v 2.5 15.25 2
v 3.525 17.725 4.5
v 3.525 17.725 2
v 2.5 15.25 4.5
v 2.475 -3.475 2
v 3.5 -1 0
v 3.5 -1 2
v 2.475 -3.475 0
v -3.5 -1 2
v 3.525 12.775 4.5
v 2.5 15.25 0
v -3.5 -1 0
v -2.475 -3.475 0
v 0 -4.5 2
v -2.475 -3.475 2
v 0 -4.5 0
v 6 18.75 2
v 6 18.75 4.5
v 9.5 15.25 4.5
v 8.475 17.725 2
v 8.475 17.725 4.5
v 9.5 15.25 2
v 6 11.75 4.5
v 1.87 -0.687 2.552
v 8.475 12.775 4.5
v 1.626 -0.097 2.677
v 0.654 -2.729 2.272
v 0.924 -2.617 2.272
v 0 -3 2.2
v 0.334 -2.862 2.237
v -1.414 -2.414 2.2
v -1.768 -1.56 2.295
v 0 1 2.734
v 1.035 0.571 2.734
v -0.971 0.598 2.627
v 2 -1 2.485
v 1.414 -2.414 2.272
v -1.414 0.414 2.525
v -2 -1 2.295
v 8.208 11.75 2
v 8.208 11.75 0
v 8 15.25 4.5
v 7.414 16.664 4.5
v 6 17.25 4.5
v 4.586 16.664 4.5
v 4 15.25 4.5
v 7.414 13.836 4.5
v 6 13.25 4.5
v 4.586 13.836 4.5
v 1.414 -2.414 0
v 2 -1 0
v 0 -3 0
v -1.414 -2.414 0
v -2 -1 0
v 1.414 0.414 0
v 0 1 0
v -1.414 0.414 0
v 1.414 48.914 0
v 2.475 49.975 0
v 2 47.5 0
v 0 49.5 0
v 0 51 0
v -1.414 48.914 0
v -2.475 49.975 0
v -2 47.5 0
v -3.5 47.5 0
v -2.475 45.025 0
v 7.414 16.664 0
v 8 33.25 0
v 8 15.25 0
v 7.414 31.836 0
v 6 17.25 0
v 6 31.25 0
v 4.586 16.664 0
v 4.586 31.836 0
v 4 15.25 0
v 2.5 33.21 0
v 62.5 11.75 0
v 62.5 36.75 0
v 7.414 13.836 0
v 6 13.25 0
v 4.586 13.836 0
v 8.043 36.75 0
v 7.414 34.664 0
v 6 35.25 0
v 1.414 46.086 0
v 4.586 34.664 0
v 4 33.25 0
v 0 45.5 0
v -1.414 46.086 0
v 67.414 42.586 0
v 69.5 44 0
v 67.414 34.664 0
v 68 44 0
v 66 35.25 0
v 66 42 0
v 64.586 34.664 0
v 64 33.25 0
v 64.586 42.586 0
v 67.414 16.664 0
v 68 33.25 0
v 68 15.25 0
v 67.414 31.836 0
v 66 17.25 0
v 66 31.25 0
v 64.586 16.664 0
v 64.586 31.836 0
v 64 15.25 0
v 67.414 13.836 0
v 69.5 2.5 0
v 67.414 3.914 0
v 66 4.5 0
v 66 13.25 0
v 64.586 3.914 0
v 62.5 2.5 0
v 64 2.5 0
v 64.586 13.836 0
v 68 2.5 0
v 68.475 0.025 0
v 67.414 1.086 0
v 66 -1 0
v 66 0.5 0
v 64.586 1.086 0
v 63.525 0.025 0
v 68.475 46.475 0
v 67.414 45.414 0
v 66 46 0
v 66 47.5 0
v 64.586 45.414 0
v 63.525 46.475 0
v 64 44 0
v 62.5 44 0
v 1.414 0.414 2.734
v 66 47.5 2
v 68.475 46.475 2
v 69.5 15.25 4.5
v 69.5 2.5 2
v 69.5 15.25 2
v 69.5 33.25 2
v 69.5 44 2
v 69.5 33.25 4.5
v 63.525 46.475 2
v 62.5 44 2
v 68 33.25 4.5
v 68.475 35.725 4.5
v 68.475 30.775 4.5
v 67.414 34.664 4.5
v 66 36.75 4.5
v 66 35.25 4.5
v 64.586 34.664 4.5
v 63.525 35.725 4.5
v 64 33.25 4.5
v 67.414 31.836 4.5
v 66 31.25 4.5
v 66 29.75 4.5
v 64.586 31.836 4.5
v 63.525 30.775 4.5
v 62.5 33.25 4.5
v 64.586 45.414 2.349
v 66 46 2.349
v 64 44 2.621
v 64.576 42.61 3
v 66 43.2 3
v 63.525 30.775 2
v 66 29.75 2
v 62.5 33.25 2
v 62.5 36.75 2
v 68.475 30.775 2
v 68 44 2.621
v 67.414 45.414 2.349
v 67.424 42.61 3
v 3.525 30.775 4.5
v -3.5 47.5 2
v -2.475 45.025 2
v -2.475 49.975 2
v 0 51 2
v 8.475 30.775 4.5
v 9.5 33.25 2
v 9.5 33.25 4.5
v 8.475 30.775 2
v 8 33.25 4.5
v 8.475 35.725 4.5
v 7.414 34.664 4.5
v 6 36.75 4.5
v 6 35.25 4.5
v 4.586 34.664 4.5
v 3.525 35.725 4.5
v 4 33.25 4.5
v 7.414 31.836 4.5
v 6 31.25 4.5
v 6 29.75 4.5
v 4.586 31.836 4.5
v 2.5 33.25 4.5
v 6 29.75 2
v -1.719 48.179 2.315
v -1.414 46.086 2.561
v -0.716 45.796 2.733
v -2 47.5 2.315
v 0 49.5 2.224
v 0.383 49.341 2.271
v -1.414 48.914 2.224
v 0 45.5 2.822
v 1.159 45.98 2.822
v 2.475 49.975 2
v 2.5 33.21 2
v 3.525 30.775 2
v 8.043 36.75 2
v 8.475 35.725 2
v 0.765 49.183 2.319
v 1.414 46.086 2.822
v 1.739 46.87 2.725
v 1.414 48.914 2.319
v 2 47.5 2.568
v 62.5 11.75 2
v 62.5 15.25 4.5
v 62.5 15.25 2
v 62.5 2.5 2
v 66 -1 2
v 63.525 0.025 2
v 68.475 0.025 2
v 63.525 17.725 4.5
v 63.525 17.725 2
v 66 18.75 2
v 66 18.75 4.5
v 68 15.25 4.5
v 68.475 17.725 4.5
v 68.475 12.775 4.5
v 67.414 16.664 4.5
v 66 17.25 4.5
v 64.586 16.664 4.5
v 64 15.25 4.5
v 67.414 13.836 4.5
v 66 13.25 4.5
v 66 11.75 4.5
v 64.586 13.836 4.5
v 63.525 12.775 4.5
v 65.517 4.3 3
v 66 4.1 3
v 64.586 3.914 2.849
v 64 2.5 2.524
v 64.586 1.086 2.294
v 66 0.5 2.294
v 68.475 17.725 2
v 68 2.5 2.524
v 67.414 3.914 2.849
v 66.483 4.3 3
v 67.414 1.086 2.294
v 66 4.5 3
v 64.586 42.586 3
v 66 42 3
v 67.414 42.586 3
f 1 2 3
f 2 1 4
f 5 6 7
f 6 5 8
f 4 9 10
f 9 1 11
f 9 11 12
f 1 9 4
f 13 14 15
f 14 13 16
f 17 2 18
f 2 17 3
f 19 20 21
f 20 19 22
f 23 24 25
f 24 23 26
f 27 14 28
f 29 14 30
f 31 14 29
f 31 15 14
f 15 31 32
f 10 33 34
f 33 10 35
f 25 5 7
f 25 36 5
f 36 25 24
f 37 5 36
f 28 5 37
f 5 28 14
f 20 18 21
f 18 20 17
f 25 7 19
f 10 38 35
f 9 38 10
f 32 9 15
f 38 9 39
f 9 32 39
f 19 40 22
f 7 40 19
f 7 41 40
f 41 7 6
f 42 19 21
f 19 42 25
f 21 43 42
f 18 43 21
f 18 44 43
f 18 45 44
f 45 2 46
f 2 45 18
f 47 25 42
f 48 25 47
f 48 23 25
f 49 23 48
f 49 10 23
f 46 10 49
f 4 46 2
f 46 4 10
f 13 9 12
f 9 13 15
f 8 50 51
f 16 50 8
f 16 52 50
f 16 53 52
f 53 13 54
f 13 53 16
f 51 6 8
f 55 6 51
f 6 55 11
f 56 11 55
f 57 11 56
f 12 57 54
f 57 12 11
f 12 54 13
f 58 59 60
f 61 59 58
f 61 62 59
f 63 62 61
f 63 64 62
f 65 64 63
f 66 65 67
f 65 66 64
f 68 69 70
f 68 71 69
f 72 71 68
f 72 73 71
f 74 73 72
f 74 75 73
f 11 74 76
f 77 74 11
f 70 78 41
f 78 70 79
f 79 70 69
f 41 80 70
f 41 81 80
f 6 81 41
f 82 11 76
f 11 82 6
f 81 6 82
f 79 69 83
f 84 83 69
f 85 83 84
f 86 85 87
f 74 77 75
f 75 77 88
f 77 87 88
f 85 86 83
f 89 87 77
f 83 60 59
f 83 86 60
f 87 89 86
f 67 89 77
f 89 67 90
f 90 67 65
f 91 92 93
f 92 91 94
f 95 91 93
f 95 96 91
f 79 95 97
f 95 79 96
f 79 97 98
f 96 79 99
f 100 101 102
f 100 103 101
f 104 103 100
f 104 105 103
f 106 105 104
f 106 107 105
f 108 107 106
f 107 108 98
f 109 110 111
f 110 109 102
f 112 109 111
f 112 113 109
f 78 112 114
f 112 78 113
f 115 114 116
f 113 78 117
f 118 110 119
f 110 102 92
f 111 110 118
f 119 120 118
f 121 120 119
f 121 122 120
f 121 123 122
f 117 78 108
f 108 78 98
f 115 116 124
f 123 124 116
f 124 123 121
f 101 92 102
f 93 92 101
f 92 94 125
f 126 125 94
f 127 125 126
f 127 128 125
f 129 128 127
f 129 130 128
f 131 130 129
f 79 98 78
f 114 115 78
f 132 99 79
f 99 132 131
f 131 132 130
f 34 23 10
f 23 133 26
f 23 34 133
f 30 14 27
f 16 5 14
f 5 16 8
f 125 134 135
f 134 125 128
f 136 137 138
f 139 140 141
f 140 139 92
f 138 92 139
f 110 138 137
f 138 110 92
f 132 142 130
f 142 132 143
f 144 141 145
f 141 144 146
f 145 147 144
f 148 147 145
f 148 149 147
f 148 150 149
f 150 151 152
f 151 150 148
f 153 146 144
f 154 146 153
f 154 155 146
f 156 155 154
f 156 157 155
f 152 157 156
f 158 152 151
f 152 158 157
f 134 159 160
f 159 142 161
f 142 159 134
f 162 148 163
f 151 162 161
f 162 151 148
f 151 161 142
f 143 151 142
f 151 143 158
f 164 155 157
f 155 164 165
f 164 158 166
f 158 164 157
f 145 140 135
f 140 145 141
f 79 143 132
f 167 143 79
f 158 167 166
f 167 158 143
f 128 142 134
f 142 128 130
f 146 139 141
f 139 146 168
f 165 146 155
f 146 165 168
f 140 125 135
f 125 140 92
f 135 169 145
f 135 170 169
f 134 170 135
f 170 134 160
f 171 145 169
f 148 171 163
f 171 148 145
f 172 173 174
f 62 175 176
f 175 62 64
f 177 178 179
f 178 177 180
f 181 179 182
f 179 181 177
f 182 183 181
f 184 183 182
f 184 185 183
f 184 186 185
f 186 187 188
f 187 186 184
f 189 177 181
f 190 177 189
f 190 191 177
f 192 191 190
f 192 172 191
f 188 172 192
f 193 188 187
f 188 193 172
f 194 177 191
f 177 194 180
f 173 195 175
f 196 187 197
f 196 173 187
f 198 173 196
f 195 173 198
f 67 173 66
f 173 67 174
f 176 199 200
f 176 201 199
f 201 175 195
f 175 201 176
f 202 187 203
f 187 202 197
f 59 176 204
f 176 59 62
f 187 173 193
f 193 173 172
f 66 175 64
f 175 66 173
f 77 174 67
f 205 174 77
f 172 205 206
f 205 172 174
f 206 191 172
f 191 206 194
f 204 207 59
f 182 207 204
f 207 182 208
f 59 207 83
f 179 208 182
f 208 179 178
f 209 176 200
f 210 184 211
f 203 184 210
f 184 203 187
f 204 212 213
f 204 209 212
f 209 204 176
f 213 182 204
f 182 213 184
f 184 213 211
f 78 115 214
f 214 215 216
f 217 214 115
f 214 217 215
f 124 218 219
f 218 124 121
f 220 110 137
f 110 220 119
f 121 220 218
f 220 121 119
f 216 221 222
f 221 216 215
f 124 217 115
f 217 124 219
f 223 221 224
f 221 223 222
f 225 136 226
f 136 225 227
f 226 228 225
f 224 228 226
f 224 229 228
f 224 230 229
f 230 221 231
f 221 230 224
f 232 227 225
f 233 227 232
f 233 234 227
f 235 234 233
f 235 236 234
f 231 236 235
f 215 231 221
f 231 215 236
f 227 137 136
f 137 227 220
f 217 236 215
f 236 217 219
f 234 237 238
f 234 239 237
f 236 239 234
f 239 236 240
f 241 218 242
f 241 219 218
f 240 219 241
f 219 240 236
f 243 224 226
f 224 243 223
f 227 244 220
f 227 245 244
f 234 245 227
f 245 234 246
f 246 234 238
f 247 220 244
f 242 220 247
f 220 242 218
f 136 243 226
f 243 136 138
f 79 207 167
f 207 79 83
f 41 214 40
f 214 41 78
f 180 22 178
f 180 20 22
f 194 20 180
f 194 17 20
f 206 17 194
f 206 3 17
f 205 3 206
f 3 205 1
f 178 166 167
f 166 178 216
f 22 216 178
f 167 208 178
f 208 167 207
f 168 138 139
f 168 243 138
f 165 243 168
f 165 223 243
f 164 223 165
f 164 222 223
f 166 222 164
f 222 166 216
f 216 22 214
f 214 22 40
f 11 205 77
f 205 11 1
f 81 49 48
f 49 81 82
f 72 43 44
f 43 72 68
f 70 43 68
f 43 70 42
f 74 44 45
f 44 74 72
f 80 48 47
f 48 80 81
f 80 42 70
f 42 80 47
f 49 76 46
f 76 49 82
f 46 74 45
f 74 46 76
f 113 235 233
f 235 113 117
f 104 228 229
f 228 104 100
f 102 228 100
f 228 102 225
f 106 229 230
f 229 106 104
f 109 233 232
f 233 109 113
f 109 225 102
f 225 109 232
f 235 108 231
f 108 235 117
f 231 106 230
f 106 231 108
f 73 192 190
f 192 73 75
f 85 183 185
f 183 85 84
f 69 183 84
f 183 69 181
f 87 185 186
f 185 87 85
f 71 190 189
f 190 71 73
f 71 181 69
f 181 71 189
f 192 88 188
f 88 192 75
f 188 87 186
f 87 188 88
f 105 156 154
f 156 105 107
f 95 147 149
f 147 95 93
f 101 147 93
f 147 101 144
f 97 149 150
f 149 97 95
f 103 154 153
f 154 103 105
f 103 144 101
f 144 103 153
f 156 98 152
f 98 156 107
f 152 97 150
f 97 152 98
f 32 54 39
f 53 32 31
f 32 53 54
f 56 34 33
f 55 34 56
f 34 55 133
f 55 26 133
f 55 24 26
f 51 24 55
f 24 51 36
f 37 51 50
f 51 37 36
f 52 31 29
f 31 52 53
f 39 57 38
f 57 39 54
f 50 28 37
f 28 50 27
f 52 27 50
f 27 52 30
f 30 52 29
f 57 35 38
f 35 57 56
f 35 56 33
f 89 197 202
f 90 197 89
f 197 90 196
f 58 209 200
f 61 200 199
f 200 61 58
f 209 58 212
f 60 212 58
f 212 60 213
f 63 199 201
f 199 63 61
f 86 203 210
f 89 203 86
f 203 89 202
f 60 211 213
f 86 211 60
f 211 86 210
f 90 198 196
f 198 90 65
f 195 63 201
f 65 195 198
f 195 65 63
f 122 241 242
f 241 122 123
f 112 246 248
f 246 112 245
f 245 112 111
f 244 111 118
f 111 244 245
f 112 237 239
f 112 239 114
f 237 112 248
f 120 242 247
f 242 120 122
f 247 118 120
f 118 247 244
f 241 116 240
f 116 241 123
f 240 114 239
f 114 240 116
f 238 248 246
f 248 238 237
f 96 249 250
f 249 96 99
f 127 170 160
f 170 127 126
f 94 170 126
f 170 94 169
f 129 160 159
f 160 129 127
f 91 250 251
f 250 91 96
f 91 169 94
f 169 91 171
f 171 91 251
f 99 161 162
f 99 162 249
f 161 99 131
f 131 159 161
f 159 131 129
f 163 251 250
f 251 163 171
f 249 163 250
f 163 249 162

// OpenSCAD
// file: raid3r/raid3r.scad
/*Pequeña biblioteca con las funciones mas comunes*/

module agujereado(X,Y,H){
	union(){
		for(j=[0:X-1])
		{
			translate([0,j*8,0])
			{
				for(i=[0:Y-1])
				{
					translate([i*6,0,-1])cylinder(r=1.2, h=H, $fn=10);
				}
			}
		}
	}
}

module dynahole(H){
	translate([-45.5/2,-10,1])union(){
		translate([3.5+6,16,0])agujereado(4,1,H);
		translate([9.5+26.5,16,0])agujereado(4,1,H);
		translate([45.5/2,10,-1])cylinder(r=11.5,h=H);	
		translate([(45.5-20)/2,6.5,-1])cube([20,36,H]);
		translate([22.5,46,0])union(){
			translate([7,0,-1])cylinder(r=1.5, h=H, $fn=10);
			translate([-7,0,-1])cylinder(r=1.5, h=H, $fn=10);
		}
	}
}

module cruz(H){
	translate([-34,-13,3])union(){
		translate([34,13,-3]) cylinder(r=4,h=H);
		translate([42,13,-3]) cylinder(r=1.5,h=H);
		translate([26,13,-3]) cylinder(r=1.5,h=H);
		translate([34,21,-3]) cylinder(r=1.5,h=H);
		translate([34,5,-3]) cylinder(r=1.5,h=H);
	}
}

module miniservo(H){
	translate([-15,-7,0])union(){
		translate([15,7,0])rotate([0,0,0])cylinder(r=8,h=H);
		translate([-1.75,7,0])union(){
			cylinder(r=1.5, h=H,$fn=20);
			translate([27.5,0,0])cylinder(r=1.5, h=H,$fn=20);
		}
	}
}

module beagleboneHoles(z){
union(){
	translate([0,0,-1])cylinder(r=2,h=z, $fn=8);
	translate([0,46.5,-1])cylinder(r=2,h=z, $fn=8);
	translate([64.5+1.5,2.5,-1])cylinder(r=2,h=z, $fn=8);
	translate([64.5+1.5,44,-1])cylinder(r=2,h=z, $fn=8);
	translate([0,0,-1])cylinder(r=3,h=3, $fn=8);
	translate([0,46.5,-1])cylinder(r=3,h=3, $fn=8);
	translate([64.5+1.5,2.5,-1])cylinder(r=3,h=3, $fn=8);
	translate([64.5+1.5,44,-1])cylinder(r=3,h=3, $fn=8);
	}
}
// main file
use <raid3r/raid3r.scad>

z=2;
x=6;
y=46.5/2-8;
difference(){
	union(){
		hull(){
			translate([0,-1,0])cylinder(r=3.5,h=z, $fn=8);
			translate([0+x,0+y,0])cylinder(r=3.5,h=z+2.5, $fn=8);
		}
		hull(){
			translate([66,44,0])cylinder(r=3.5,h=z, $fn=8);
			translate([60+x,18+y,0])cylinder(r=3.5,h=z+2.5, $fn=8);
		}
		hull(){
			translate([0,47.5,0])cylinder(r=3.5,h=z, $fn=8);
			translate([0+x,18+y,0])cylinder(r=3.5,h=z+2.5, $fn=8);
		}
		hull(){
			translate([66,2.5,0])cylinder(r=3.5,h=z, $fn=8);
			translate([60+x,0+y,0])cylinder(r=3.5,h=z+2.5, $fn=8);
		}
		hull(){
			translate([0+x,0+y,0])cylinder(r=3.5,h=z, $fn=8);
			translate([60+x,0+y,0])cylinder(r=3.5,h=z, $fn=8);
			translate([0+x,18+y,0])cylinder(r=3.5,h=z, $fn=8);
			translate([60+x,18+y,0])cylinder(r=3.5,h=z, $fn=8);
		}
	}
	translate([0+x,0+y,-1])cylinder(r=2,h=z+6, $fn=8);
	translate([60+x,0+y,-1])cylinder(r=2,h=z+6, $fn=8);
	translate([0+x,18+y,-1])cylinder(r=2,h=z+6, $fn=8);
	translate([60+x,18+y,-1])cylinder(r=2,h=z+6, $fn=8);
	translate([0,-1,-1])cylinder(r=2,h=z+2, $fn=8);
	translate([0,47.5,-1])cylinder(r=2,h=z+2, $fn=8);
	translate([66,2.5,-1])cylinder(r=2,h=z+2, $fn=8);
	translate([66,44,-1])cylinder(r=2,h=z+2, $fn=8);
}
